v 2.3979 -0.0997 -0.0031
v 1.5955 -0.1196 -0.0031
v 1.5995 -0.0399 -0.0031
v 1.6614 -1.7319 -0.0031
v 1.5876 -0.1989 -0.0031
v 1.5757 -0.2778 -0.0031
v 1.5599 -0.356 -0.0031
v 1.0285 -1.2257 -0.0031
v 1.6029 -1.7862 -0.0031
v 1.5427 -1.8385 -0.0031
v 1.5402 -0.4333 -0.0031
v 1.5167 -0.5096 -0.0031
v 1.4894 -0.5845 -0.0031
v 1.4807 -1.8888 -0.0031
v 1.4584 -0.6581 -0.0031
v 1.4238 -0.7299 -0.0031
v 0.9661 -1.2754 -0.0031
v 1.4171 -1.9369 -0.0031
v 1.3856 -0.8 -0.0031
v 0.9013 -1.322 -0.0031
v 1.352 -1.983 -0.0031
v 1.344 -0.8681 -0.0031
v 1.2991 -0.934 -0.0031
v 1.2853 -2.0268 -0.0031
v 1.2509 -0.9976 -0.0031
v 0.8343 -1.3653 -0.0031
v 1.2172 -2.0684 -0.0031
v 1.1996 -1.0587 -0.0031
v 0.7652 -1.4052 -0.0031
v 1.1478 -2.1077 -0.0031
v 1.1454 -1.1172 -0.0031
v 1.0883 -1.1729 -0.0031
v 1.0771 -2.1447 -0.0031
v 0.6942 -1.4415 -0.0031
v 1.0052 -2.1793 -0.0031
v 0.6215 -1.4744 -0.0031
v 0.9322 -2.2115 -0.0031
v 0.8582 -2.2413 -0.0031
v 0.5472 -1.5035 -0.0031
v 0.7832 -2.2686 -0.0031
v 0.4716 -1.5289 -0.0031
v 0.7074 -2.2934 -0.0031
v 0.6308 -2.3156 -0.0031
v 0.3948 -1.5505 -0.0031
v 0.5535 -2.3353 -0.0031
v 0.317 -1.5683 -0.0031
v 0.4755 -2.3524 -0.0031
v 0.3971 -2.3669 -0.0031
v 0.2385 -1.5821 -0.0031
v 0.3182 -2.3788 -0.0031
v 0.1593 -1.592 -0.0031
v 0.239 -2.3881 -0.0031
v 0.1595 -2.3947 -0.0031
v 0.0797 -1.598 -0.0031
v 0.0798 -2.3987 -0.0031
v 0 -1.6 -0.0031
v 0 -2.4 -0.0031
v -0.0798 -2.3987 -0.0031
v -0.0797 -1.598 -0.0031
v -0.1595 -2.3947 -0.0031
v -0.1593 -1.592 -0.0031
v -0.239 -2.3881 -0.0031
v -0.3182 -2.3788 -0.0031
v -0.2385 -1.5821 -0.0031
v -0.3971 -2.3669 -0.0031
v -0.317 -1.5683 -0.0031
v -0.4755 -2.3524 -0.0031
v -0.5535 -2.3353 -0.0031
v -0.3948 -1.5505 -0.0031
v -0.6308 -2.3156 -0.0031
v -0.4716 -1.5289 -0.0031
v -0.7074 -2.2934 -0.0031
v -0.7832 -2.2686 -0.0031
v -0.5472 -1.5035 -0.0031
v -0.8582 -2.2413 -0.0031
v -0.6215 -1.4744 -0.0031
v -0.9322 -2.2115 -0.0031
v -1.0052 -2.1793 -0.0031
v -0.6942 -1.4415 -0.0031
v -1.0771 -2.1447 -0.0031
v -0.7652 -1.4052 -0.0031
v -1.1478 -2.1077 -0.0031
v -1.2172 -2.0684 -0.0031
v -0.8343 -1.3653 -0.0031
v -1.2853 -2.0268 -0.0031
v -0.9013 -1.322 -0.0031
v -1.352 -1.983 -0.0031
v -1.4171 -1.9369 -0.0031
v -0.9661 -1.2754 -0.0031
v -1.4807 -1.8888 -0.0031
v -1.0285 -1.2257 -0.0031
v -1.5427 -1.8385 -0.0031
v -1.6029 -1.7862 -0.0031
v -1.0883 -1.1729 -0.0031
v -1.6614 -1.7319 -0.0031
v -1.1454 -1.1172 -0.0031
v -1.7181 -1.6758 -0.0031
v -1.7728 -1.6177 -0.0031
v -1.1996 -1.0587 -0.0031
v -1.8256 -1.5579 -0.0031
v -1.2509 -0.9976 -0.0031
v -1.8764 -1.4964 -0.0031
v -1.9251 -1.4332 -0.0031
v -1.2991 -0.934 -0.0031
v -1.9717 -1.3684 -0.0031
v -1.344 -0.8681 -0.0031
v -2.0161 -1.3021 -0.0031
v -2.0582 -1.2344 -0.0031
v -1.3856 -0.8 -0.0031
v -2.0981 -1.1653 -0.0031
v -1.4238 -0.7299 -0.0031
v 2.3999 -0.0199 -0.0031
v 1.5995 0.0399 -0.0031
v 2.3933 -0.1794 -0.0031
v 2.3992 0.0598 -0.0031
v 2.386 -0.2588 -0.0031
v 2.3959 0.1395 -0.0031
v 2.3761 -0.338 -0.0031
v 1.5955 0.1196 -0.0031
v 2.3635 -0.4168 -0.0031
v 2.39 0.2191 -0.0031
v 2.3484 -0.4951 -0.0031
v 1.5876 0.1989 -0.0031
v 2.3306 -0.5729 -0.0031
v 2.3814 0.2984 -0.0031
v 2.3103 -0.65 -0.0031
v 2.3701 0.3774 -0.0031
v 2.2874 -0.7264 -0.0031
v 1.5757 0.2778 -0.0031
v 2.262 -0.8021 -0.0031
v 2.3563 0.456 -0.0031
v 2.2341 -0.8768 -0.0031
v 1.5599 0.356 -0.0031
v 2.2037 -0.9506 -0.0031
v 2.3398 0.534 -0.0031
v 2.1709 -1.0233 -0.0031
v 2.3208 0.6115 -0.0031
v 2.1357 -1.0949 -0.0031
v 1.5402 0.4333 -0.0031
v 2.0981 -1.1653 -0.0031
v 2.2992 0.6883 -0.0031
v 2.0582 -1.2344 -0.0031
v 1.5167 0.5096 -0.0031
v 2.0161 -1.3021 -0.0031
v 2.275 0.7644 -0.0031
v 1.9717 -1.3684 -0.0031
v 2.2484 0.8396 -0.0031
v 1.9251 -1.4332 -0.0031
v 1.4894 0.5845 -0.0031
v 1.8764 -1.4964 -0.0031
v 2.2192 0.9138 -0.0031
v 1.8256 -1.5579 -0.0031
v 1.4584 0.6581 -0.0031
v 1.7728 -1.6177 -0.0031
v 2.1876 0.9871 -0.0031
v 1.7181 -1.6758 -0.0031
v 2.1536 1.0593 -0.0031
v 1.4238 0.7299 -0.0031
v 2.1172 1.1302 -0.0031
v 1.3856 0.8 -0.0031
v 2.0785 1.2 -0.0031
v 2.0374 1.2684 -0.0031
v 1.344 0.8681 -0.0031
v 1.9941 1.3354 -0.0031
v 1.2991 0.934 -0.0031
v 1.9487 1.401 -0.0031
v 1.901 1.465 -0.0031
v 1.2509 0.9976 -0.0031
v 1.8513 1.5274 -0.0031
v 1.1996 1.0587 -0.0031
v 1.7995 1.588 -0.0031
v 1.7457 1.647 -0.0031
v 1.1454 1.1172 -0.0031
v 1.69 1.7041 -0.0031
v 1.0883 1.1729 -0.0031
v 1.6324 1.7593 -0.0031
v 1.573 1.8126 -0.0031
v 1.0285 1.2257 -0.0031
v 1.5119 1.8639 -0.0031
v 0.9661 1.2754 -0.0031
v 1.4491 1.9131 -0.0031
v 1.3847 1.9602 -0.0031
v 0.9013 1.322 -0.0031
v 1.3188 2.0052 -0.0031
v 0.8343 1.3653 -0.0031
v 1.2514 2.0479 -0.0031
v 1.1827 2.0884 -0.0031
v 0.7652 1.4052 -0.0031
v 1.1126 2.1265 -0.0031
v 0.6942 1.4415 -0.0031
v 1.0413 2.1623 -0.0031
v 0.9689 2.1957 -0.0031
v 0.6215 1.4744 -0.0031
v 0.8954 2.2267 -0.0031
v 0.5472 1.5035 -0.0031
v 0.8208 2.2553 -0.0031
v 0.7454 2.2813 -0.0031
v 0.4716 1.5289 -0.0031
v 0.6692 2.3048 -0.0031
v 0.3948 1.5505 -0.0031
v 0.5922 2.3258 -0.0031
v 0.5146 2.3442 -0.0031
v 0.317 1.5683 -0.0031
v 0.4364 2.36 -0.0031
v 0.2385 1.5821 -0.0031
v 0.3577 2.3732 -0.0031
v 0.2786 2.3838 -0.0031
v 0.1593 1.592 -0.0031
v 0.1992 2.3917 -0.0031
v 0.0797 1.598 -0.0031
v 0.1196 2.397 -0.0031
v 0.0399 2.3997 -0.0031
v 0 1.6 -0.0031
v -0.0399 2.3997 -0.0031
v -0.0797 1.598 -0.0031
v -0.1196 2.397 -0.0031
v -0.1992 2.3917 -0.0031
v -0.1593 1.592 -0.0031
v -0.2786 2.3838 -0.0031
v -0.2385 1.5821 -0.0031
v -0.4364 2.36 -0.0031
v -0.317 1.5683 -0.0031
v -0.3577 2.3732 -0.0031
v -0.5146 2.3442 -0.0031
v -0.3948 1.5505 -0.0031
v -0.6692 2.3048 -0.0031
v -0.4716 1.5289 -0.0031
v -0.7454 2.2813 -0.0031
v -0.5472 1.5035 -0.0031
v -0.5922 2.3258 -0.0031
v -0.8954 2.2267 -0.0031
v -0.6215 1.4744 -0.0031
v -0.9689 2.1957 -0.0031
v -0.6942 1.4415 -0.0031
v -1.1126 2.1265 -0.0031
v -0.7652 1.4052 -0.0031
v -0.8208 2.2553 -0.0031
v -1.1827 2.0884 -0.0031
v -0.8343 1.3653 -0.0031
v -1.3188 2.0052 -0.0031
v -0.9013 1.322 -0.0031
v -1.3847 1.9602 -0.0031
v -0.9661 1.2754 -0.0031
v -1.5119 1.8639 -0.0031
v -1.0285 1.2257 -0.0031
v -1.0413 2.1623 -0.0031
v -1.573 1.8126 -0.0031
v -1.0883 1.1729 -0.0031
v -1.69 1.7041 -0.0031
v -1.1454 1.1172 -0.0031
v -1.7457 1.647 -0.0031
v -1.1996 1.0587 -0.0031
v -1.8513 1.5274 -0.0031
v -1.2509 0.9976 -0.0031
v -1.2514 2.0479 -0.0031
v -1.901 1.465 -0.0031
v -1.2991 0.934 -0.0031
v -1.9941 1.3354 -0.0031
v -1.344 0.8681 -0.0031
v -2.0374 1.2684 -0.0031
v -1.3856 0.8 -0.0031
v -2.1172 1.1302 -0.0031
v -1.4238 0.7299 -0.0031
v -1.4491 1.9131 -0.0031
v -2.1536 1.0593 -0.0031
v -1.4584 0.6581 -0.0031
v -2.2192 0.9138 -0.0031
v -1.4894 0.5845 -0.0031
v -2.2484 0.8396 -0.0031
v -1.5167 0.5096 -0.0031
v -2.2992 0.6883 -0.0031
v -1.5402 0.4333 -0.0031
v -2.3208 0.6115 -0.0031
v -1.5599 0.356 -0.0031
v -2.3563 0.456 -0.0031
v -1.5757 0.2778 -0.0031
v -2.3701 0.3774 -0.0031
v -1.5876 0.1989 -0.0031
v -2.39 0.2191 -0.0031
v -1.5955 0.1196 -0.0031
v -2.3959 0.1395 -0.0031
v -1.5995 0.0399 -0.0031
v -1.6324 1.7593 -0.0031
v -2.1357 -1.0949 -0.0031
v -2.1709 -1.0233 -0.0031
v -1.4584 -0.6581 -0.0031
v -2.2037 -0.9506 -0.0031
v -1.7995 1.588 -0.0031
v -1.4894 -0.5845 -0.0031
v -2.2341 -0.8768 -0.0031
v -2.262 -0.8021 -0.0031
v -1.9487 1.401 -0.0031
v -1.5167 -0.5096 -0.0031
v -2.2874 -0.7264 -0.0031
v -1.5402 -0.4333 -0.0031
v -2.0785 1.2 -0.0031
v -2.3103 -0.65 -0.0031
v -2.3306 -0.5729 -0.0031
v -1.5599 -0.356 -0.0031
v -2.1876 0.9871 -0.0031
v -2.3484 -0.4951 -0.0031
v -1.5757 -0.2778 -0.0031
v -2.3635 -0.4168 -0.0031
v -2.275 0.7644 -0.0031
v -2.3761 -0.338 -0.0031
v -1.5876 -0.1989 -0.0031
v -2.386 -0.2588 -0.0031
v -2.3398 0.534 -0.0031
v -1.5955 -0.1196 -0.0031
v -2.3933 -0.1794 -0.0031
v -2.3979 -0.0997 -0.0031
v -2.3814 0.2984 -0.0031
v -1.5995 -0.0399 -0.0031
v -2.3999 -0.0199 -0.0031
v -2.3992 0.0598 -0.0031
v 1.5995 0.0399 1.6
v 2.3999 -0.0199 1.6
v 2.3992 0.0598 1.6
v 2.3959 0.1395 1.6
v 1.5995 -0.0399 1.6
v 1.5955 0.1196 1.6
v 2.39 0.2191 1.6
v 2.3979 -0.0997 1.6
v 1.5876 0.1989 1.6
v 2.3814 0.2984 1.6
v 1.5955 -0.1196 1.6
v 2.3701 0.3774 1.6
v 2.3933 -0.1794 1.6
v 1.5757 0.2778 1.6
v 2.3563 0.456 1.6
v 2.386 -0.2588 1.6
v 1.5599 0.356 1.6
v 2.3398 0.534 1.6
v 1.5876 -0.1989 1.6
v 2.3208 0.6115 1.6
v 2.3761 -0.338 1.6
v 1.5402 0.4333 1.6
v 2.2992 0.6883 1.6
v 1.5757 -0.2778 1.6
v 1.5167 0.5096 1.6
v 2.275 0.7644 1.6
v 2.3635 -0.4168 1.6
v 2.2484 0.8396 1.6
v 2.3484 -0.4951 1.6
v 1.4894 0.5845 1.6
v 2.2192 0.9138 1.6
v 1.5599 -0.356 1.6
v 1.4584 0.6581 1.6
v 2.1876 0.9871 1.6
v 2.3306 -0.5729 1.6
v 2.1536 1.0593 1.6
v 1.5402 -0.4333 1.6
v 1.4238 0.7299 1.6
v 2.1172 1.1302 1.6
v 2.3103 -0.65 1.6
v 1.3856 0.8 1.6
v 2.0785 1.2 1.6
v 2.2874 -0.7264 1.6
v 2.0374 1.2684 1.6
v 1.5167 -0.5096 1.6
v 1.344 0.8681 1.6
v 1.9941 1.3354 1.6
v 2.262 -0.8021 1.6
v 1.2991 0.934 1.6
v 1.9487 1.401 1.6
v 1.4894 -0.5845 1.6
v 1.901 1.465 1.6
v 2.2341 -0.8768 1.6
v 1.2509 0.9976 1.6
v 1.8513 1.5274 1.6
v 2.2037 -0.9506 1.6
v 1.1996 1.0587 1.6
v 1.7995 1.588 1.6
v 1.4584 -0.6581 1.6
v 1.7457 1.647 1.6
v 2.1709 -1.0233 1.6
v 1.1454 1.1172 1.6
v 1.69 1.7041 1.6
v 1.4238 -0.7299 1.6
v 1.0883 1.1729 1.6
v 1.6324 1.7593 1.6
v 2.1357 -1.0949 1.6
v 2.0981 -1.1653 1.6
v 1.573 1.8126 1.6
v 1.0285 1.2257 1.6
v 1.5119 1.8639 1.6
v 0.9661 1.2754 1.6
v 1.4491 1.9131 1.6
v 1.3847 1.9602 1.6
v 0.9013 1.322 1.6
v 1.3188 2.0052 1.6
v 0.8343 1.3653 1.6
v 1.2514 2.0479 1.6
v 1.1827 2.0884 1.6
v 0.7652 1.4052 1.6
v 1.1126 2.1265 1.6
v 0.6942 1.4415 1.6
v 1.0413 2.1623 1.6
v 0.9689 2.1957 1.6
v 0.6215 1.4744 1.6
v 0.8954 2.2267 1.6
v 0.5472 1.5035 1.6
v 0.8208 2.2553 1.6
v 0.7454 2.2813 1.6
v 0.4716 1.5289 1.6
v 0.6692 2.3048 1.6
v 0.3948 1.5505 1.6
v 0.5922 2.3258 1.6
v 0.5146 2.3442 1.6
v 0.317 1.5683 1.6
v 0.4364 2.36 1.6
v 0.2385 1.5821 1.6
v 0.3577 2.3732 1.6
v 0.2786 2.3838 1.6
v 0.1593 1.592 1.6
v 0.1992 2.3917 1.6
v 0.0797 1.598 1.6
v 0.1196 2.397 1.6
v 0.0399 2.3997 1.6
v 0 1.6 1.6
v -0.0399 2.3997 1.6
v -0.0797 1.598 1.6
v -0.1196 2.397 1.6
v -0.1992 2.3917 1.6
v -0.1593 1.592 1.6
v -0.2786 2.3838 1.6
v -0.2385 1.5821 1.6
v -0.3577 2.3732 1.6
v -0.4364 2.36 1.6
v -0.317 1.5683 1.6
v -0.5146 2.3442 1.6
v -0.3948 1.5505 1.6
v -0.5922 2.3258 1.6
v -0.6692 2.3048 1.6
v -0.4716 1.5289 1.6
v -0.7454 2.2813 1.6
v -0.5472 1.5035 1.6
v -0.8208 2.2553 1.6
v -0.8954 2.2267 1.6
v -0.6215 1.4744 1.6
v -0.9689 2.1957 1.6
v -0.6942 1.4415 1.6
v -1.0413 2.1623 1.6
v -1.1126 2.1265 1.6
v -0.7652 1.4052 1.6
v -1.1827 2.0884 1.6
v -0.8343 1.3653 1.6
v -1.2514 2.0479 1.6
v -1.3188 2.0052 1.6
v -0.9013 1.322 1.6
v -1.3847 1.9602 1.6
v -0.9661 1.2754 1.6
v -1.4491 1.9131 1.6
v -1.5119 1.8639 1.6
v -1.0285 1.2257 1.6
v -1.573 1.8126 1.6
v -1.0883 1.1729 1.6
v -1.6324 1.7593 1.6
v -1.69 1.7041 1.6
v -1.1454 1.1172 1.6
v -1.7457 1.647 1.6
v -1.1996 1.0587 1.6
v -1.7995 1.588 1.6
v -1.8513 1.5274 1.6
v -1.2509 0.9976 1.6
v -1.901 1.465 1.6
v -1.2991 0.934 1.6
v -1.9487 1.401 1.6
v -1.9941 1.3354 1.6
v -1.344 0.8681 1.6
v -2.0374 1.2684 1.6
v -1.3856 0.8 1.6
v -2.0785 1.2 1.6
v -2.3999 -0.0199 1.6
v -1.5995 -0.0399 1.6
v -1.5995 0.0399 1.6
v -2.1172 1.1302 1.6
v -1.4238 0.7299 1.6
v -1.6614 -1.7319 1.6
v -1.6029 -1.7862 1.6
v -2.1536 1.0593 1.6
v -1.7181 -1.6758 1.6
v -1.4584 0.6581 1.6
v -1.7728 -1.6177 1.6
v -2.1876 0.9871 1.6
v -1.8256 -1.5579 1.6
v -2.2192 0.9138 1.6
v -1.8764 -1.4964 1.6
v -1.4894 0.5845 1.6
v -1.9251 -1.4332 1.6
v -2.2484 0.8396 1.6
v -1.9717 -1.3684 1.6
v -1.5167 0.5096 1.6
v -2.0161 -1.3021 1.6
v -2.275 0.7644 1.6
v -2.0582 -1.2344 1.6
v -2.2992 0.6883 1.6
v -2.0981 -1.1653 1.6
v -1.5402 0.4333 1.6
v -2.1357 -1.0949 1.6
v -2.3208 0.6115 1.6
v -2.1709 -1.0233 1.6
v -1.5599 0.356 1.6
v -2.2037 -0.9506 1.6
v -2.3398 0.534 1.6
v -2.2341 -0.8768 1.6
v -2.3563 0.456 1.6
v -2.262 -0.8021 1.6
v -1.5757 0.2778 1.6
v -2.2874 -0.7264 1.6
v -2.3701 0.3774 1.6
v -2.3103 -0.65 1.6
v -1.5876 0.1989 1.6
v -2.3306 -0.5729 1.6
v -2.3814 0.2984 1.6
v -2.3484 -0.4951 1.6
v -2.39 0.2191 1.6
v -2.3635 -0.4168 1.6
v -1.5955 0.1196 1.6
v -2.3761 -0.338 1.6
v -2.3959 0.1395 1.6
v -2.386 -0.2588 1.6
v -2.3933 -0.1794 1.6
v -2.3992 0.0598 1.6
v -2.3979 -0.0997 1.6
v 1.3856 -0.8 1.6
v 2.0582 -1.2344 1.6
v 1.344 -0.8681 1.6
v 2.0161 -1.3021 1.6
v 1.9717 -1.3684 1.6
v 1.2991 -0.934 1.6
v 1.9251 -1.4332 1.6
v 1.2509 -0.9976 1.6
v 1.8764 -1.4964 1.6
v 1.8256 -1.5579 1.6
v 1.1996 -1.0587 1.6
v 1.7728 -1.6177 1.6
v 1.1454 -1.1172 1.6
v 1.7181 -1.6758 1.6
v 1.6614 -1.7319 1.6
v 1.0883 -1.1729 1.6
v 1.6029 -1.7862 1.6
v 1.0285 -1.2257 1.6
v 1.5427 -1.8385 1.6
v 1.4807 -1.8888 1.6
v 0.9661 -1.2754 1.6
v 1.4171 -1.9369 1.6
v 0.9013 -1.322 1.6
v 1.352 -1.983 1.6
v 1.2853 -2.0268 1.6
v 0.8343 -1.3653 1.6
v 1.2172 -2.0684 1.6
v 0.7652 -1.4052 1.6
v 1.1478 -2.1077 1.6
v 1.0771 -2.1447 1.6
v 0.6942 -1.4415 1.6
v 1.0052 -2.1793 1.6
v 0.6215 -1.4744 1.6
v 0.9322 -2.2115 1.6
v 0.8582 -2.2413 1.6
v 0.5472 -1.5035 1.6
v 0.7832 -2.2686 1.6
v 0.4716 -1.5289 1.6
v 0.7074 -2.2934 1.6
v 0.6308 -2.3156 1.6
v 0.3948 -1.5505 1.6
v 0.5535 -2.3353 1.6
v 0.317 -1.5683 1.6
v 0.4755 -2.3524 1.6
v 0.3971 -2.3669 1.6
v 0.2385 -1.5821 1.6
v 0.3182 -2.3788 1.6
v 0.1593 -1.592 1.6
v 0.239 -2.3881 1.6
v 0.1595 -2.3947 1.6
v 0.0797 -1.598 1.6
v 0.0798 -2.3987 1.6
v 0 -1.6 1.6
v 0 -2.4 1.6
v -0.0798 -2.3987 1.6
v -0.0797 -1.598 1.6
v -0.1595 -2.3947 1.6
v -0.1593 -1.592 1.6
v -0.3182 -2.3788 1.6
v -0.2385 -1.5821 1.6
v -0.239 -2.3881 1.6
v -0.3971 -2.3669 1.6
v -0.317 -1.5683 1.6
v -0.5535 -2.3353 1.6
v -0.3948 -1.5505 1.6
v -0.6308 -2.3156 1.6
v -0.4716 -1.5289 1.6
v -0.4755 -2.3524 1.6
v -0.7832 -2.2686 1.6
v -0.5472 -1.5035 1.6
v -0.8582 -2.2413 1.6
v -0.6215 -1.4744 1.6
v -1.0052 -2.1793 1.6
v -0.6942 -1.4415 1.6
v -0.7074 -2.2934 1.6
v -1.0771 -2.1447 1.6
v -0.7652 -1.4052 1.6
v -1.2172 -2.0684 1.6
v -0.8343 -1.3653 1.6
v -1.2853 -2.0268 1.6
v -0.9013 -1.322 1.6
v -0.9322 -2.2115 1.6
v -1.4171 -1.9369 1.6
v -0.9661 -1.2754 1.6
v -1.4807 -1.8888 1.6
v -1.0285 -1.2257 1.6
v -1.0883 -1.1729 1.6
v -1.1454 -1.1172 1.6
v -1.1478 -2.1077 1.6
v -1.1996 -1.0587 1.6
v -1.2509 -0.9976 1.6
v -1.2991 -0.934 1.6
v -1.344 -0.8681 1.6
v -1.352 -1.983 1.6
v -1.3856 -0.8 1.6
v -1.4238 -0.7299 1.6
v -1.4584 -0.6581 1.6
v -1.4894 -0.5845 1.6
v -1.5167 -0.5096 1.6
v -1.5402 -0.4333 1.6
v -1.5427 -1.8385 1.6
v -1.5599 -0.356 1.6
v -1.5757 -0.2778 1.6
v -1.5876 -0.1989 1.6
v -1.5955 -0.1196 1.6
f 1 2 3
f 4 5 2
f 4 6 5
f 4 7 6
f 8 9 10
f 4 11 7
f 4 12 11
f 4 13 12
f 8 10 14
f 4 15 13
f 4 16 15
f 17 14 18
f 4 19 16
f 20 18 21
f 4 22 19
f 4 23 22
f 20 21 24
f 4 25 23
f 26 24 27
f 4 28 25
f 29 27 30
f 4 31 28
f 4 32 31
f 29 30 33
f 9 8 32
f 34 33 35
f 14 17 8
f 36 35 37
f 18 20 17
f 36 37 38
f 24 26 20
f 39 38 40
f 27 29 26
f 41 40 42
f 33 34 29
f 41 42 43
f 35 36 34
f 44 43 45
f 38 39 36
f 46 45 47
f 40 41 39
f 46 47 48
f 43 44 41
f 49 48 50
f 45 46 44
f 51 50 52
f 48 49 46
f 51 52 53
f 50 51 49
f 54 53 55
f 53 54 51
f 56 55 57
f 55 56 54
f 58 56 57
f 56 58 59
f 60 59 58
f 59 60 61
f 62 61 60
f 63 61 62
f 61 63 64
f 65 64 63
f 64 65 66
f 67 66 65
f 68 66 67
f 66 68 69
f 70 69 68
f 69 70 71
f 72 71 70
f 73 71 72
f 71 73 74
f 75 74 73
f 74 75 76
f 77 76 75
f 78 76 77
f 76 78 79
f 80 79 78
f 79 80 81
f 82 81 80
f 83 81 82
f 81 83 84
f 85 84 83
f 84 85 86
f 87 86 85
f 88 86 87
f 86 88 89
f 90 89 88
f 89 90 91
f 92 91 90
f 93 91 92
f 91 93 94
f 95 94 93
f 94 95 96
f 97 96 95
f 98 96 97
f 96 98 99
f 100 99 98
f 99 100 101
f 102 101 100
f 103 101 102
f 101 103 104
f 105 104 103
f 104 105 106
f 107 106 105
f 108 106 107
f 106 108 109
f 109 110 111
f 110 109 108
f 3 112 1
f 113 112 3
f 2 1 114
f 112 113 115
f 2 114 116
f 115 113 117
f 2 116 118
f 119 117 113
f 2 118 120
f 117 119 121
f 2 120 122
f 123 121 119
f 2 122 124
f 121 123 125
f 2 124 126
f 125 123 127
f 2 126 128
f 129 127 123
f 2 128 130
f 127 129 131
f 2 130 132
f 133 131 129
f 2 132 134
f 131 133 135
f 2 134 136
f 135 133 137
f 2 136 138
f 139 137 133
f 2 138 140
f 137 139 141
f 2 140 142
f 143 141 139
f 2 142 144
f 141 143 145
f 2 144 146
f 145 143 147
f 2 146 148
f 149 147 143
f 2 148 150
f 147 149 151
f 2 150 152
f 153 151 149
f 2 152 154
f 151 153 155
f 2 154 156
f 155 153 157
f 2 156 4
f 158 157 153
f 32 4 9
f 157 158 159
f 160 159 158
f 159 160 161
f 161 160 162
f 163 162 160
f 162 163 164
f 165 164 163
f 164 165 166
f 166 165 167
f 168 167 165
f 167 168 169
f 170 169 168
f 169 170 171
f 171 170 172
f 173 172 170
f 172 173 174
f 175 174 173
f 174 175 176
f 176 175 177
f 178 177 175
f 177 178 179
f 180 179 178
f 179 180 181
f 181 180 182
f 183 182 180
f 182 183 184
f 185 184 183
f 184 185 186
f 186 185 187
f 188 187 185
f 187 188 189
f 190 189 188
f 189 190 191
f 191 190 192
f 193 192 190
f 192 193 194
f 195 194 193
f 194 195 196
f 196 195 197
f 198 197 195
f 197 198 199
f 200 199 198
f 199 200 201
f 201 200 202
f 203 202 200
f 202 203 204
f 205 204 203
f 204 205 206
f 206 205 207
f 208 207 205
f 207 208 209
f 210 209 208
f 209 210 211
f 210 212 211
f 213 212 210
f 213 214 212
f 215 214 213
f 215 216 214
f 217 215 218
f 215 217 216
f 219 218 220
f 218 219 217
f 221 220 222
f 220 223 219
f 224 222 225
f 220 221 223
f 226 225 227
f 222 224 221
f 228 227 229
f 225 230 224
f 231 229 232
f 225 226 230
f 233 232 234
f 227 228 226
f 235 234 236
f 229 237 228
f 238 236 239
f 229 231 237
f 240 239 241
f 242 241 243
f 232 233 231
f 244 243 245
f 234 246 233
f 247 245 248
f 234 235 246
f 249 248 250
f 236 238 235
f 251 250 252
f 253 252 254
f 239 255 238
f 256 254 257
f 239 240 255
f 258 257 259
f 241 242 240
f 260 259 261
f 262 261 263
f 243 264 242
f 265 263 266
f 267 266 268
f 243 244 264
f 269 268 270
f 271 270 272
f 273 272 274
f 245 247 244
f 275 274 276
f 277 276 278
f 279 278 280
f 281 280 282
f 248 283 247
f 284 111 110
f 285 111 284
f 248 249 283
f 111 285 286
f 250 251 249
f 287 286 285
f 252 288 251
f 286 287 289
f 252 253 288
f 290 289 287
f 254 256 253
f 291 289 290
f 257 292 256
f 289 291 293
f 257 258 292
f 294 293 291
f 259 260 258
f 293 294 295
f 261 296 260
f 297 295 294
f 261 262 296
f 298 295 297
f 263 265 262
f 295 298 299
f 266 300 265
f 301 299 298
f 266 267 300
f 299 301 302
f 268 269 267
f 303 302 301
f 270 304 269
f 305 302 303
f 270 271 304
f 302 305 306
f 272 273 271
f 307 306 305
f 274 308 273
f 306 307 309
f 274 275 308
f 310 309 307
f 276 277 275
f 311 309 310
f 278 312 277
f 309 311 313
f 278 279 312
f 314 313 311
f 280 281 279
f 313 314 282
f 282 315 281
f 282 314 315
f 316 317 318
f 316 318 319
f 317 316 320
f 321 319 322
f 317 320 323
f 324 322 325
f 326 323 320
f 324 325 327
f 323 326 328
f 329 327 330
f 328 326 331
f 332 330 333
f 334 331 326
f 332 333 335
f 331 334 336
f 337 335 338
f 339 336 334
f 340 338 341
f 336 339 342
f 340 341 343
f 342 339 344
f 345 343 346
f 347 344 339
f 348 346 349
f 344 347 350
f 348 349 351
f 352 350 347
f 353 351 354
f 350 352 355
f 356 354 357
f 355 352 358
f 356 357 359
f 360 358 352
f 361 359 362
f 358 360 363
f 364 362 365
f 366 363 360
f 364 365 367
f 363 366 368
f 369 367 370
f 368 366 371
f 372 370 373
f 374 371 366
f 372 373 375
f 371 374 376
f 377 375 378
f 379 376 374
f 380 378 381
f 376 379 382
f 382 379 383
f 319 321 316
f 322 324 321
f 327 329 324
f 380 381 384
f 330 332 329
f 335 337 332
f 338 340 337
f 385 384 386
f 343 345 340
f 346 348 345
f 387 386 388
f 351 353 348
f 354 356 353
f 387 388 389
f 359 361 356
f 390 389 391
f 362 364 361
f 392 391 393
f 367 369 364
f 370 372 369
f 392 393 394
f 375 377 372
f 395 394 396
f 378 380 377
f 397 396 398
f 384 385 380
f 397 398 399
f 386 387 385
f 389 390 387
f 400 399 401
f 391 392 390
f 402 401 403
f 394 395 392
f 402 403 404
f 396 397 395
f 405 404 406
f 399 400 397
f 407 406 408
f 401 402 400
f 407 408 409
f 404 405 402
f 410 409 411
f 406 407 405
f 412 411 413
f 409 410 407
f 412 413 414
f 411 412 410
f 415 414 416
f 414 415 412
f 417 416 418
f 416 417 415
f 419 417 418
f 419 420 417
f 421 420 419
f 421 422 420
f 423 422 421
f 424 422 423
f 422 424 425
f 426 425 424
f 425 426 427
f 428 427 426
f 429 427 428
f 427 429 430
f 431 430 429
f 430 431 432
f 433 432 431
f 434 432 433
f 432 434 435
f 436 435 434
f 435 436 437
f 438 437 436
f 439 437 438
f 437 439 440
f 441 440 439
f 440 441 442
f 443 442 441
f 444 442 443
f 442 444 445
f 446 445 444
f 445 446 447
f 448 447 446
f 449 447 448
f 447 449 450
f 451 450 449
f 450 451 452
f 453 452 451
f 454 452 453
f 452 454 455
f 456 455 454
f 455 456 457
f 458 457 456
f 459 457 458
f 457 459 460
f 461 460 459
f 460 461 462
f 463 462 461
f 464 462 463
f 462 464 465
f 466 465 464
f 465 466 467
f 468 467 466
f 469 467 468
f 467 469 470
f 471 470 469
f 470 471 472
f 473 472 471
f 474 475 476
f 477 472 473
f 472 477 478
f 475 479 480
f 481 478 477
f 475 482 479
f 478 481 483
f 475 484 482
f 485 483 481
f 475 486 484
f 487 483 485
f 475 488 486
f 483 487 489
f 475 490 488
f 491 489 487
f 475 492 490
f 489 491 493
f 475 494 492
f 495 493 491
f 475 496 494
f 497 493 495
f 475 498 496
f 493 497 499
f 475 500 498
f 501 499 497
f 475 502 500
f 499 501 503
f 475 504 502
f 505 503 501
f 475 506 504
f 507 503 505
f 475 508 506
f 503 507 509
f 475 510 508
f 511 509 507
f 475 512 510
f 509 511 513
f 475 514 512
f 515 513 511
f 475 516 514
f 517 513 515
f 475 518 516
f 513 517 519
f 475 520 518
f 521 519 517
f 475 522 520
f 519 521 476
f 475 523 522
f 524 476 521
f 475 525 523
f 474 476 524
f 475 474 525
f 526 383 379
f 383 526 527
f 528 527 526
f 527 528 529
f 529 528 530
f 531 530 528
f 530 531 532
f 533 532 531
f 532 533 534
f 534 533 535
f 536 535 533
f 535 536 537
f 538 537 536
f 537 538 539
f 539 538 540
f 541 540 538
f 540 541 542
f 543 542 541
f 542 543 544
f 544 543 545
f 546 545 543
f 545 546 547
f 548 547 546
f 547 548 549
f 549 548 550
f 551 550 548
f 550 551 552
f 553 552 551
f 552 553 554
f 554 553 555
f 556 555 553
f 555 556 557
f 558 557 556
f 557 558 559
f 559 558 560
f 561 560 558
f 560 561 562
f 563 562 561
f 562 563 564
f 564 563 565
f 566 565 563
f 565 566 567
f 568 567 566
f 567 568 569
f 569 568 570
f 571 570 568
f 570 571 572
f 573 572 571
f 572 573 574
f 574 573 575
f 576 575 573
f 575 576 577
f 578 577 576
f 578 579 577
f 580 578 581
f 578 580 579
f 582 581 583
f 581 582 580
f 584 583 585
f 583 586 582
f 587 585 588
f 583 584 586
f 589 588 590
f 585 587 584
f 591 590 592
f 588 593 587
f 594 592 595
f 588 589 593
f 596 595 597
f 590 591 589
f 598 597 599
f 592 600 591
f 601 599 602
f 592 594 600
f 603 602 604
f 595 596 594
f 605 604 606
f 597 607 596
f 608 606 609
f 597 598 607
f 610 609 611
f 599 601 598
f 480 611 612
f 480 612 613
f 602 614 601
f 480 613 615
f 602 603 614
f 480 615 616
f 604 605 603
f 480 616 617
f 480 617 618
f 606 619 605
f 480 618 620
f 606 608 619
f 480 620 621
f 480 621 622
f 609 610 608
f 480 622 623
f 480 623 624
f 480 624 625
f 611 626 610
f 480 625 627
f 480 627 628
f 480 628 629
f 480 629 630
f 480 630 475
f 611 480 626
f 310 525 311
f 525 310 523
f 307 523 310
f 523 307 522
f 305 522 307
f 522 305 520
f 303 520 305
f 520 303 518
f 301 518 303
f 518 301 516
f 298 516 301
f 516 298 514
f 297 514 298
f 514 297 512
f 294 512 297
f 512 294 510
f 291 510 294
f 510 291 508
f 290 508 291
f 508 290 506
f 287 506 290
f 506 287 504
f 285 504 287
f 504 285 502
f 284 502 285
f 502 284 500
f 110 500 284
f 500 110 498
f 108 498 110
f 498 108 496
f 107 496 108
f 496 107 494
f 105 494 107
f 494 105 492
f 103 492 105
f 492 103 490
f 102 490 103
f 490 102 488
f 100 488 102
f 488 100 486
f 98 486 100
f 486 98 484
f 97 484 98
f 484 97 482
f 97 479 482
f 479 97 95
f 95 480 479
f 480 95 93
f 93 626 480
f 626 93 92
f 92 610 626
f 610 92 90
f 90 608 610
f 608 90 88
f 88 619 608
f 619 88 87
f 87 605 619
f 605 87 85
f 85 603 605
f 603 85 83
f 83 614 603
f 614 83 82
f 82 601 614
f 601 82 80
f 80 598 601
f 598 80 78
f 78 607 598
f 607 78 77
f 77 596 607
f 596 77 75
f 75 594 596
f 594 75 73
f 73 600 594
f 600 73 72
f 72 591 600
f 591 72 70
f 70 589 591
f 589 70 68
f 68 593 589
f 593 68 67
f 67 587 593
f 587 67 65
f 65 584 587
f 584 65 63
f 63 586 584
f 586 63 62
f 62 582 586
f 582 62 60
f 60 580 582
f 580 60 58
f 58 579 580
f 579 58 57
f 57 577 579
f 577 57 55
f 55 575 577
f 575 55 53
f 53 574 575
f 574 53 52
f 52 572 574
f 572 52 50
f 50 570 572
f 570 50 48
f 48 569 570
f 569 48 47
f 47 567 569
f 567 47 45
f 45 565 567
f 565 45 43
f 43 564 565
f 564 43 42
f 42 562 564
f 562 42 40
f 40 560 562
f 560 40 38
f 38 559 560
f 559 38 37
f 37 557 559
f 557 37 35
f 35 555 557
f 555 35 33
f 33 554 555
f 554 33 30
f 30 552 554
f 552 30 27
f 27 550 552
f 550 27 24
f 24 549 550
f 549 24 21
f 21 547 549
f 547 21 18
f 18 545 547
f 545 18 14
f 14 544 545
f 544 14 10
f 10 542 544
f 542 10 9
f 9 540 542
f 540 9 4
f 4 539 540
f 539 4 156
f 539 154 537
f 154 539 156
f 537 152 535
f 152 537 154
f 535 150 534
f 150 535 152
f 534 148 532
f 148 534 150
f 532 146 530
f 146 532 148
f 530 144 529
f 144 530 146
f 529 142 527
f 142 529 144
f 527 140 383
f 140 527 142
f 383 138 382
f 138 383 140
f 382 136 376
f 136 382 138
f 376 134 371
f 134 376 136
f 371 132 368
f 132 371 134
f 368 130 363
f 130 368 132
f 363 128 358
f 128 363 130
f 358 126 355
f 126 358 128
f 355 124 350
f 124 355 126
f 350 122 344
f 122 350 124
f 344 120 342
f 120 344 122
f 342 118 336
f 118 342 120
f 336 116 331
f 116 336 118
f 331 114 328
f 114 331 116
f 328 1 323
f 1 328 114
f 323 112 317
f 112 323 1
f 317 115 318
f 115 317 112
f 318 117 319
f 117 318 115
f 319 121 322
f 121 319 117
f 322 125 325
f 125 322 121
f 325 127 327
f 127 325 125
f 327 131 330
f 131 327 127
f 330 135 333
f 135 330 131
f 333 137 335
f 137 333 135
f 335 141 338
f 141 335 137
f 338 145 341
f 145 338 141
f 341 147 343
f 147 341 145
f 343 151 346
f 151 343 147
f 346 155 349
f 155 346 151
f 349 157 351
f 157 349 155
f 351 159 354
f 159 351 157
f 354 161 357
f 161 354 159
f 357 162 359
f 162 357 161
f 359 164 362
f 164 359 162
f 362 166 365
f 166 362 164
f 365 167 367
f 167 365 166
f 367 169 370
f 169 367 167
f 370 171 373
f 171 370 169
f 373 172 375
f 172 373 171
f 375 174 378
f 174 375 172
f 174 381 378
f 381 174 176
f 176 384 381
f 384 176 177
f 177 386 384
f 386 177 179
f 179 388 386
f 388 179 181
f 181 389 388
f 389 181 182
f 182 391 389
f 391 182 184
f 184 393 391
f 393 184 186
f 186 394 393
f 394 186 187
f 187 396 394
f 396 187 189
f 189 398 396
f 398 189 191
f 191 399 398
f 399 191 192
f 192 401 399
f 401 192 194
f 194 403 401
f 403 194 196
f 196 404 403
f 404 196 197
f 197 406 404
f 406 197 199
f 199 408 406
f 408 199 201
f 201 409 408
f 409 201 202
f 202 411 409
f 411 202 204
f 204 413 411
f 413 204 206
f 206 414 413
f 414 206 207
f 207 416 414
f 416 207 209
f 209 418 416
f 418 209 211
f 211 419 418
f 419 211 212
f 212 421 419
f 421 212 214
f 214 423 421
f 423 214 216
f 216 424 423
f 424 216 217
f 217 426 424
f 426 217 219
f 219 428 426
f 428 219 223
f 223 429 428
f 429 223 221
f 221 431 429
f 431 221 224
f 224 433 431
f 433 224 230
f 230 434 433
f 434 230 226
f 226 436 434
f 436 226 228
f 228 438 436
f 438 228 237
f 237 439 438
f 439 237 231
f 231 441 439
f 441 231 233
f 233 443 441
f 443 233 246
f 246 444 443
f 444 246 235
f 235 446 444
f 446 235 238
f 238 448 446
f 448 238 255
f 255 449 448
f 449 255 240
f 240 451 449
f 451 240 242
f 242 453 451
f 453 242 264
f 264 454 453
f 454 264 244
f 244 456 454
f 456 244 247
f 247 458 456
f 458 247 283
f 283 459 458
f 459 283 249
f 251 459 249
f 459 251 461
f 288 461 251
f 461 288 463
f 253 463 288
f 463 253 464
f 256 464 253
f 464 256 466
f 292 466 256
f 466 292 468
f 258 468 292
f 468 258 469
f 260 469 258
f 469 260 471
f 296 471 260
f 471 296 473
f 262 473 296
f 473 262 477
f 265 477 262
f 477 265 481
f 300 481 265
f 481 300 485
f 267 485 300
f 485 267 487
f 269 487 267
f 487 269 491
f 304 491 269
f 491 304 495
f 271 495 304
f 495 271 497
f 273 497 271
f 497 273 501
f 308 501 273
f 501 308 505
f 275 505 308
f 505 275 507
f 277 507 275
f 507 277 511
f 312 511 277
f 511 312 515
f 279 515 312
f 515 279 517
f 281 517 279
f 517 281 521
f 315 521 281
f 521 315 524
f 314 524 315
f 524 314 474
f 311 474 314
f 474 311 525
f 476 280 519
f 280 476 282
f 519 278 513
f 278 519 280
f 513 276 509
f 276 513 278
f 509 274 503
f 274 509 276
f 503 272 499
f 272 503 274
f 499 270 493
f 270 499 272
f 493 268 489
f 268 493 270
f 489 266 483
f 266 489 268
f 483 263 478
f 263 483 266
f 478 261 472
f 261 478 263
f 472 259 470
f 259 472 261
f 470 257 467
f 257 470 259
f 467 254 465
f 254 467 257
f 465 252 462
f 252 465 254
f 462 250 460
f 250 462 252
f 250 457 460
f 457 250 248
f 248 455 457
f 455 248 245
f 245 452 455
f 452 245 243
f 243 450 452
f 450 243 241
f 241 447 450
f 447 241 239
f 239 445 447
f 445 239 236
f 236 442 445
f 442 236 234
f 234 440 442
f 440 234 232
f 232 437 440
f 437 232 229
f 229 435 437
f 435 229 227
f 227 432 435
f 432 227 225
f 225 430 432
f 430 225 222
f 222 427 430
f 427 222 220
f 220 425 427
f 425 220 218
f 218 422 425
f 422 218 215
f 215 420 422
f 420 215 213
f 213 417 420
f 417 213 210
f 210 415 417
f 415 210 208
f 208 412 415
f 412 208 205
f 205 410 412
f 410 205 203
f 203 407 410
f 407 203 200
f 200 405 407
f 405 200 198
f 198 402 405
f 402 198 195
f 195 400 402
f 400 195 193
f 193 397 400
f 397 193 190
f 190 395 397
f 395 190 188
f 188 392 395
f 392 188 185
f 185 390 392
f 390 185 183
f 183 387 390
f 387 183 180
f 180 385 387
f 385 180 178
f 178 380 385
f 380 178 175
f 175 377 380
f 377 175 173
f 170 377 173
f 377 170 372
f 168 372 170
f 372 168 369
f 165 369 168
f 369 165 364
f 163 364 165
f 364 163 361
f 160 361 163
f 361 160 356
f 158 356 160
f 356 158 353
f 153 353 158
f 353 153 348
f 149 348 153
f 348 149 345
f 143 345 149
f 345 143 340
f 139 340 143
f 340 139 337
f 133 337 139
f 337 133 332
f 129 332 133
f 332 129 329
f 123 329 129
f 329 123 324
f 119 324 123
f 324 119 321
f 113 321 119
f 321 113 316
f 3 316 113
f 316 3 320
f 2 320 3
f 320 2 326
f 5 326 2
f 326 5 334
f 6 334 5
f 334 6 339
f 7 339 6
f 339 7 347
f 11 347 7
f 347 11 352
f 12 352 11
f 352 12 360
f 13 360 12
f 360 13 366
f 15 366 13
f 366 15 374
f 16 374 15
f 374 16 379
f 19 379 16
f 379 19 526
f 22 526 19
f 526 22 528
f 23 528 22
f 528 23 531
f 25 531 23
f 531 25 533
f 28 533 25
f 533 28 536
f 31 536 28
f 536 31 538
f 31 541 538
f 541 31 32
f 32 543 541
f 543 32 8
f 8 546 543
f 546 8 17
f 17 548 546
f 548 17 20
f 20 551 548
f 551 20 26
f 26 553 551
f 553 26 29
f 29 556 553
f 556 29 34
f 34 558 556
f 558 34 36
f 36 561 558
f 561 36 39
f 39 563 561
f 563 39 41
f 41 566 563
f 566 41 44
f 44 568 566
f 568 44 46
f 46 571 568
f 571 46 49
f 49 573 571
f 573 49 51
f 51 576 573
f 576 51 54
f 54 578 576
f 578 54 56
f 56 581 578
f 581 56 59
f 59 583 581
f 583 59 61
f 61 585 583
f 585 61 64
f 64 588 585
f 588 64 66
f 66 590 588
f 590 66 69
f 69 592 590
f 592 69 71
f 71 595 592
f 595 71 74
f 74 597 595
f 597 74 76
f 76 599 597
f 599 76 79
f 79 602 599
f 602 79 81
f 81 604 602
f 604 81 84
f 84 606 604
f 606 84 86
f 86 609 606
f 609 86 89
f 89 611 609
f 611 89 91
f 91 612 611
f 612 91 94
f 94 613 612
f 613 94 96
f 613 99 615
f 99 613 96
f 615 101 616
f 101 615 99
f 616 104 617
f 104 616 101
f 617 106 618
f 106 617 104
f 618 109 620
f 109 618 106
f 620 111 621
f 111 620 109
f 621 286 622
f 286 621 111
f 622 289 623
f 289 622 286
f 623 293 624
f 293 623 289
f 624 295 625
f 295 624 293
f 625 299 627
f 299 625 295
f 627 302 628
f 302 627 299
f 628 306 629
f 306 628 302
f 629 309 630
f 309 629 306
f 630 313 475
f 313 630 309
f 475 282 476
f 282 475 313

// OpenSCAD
use <../lib.scad>
use <s/4181s01.scad>
use <s/4181s02.scad>
use <../p/stud2.scad>
$fa=1; $fs=0.2;
function ldraw_lib__4182p02(realsolid=false) = [
// 0 Train Door  1 x  4 x  5 Right with Red Bottom Half Pattern
// 0 Name: 4182p02.dat
// 0 Author: James Jessiman
// 0 !LDRAW_ORG Part UPDATE 2009-02
// 0 !LICENSE Licensed under CC BY 2.0 and CC BY 4.0 : see CAreadme.txt
// 
// 0 BFC CERTIFY CCW
  [0,"BFC","CERTIFY"],
  [0,"BFC","CCW"],
// 
// 0 !HISTORY 2007-07-04 [PTadmin] Header formatted for Contributor Agreement
// 0 !HISTORY 2008-07-01 [PTadmin] Official Update 2008-01
// 0 !HISTORY 2008-07-07 [WilliamH] BFCed; sub-parted (2006-09-12)
// 0 !HISTORY 2009-09-03 [PTadmin] Official Update 2009-02
// 
// 
// 1 16 0 0 0 1 0 0 0 1 0 0 0 1 stud2.dat
  [1,16,0,0,0,1,0,0,0,1,0,0,0,1, ldraw_lib__stud2(realsolid)],
// 1 16 0 0 0 -1 0 0 0 1 0 0 0 1 s\4181s01.dat
  [1,16,0,0,0,-1,0,0,0,1,0,0,0,1, ldraw_lib__s__4181s01(realsolid)],
// 1 4 0 72 0 -1 0 0 0 6 0 0 0 1 s\4181s02.dat
  [1,4,0,72,0,-1,0,0,0,6,0,0,0,1, ldraw_lib__s__4181s02(realsolid)],
// 0
];
module ldraw_lib__4182p02(step=0, col=false, unit=2/5, alt=false, line=0.2, solid=!$preview)
    makepoly(ldraw_lib__4182p02(solid), step=step, col=col, unit=unit, alt=alt, line=line, solid=solid);
ldraw_lib__4182p02(line=0.2);
